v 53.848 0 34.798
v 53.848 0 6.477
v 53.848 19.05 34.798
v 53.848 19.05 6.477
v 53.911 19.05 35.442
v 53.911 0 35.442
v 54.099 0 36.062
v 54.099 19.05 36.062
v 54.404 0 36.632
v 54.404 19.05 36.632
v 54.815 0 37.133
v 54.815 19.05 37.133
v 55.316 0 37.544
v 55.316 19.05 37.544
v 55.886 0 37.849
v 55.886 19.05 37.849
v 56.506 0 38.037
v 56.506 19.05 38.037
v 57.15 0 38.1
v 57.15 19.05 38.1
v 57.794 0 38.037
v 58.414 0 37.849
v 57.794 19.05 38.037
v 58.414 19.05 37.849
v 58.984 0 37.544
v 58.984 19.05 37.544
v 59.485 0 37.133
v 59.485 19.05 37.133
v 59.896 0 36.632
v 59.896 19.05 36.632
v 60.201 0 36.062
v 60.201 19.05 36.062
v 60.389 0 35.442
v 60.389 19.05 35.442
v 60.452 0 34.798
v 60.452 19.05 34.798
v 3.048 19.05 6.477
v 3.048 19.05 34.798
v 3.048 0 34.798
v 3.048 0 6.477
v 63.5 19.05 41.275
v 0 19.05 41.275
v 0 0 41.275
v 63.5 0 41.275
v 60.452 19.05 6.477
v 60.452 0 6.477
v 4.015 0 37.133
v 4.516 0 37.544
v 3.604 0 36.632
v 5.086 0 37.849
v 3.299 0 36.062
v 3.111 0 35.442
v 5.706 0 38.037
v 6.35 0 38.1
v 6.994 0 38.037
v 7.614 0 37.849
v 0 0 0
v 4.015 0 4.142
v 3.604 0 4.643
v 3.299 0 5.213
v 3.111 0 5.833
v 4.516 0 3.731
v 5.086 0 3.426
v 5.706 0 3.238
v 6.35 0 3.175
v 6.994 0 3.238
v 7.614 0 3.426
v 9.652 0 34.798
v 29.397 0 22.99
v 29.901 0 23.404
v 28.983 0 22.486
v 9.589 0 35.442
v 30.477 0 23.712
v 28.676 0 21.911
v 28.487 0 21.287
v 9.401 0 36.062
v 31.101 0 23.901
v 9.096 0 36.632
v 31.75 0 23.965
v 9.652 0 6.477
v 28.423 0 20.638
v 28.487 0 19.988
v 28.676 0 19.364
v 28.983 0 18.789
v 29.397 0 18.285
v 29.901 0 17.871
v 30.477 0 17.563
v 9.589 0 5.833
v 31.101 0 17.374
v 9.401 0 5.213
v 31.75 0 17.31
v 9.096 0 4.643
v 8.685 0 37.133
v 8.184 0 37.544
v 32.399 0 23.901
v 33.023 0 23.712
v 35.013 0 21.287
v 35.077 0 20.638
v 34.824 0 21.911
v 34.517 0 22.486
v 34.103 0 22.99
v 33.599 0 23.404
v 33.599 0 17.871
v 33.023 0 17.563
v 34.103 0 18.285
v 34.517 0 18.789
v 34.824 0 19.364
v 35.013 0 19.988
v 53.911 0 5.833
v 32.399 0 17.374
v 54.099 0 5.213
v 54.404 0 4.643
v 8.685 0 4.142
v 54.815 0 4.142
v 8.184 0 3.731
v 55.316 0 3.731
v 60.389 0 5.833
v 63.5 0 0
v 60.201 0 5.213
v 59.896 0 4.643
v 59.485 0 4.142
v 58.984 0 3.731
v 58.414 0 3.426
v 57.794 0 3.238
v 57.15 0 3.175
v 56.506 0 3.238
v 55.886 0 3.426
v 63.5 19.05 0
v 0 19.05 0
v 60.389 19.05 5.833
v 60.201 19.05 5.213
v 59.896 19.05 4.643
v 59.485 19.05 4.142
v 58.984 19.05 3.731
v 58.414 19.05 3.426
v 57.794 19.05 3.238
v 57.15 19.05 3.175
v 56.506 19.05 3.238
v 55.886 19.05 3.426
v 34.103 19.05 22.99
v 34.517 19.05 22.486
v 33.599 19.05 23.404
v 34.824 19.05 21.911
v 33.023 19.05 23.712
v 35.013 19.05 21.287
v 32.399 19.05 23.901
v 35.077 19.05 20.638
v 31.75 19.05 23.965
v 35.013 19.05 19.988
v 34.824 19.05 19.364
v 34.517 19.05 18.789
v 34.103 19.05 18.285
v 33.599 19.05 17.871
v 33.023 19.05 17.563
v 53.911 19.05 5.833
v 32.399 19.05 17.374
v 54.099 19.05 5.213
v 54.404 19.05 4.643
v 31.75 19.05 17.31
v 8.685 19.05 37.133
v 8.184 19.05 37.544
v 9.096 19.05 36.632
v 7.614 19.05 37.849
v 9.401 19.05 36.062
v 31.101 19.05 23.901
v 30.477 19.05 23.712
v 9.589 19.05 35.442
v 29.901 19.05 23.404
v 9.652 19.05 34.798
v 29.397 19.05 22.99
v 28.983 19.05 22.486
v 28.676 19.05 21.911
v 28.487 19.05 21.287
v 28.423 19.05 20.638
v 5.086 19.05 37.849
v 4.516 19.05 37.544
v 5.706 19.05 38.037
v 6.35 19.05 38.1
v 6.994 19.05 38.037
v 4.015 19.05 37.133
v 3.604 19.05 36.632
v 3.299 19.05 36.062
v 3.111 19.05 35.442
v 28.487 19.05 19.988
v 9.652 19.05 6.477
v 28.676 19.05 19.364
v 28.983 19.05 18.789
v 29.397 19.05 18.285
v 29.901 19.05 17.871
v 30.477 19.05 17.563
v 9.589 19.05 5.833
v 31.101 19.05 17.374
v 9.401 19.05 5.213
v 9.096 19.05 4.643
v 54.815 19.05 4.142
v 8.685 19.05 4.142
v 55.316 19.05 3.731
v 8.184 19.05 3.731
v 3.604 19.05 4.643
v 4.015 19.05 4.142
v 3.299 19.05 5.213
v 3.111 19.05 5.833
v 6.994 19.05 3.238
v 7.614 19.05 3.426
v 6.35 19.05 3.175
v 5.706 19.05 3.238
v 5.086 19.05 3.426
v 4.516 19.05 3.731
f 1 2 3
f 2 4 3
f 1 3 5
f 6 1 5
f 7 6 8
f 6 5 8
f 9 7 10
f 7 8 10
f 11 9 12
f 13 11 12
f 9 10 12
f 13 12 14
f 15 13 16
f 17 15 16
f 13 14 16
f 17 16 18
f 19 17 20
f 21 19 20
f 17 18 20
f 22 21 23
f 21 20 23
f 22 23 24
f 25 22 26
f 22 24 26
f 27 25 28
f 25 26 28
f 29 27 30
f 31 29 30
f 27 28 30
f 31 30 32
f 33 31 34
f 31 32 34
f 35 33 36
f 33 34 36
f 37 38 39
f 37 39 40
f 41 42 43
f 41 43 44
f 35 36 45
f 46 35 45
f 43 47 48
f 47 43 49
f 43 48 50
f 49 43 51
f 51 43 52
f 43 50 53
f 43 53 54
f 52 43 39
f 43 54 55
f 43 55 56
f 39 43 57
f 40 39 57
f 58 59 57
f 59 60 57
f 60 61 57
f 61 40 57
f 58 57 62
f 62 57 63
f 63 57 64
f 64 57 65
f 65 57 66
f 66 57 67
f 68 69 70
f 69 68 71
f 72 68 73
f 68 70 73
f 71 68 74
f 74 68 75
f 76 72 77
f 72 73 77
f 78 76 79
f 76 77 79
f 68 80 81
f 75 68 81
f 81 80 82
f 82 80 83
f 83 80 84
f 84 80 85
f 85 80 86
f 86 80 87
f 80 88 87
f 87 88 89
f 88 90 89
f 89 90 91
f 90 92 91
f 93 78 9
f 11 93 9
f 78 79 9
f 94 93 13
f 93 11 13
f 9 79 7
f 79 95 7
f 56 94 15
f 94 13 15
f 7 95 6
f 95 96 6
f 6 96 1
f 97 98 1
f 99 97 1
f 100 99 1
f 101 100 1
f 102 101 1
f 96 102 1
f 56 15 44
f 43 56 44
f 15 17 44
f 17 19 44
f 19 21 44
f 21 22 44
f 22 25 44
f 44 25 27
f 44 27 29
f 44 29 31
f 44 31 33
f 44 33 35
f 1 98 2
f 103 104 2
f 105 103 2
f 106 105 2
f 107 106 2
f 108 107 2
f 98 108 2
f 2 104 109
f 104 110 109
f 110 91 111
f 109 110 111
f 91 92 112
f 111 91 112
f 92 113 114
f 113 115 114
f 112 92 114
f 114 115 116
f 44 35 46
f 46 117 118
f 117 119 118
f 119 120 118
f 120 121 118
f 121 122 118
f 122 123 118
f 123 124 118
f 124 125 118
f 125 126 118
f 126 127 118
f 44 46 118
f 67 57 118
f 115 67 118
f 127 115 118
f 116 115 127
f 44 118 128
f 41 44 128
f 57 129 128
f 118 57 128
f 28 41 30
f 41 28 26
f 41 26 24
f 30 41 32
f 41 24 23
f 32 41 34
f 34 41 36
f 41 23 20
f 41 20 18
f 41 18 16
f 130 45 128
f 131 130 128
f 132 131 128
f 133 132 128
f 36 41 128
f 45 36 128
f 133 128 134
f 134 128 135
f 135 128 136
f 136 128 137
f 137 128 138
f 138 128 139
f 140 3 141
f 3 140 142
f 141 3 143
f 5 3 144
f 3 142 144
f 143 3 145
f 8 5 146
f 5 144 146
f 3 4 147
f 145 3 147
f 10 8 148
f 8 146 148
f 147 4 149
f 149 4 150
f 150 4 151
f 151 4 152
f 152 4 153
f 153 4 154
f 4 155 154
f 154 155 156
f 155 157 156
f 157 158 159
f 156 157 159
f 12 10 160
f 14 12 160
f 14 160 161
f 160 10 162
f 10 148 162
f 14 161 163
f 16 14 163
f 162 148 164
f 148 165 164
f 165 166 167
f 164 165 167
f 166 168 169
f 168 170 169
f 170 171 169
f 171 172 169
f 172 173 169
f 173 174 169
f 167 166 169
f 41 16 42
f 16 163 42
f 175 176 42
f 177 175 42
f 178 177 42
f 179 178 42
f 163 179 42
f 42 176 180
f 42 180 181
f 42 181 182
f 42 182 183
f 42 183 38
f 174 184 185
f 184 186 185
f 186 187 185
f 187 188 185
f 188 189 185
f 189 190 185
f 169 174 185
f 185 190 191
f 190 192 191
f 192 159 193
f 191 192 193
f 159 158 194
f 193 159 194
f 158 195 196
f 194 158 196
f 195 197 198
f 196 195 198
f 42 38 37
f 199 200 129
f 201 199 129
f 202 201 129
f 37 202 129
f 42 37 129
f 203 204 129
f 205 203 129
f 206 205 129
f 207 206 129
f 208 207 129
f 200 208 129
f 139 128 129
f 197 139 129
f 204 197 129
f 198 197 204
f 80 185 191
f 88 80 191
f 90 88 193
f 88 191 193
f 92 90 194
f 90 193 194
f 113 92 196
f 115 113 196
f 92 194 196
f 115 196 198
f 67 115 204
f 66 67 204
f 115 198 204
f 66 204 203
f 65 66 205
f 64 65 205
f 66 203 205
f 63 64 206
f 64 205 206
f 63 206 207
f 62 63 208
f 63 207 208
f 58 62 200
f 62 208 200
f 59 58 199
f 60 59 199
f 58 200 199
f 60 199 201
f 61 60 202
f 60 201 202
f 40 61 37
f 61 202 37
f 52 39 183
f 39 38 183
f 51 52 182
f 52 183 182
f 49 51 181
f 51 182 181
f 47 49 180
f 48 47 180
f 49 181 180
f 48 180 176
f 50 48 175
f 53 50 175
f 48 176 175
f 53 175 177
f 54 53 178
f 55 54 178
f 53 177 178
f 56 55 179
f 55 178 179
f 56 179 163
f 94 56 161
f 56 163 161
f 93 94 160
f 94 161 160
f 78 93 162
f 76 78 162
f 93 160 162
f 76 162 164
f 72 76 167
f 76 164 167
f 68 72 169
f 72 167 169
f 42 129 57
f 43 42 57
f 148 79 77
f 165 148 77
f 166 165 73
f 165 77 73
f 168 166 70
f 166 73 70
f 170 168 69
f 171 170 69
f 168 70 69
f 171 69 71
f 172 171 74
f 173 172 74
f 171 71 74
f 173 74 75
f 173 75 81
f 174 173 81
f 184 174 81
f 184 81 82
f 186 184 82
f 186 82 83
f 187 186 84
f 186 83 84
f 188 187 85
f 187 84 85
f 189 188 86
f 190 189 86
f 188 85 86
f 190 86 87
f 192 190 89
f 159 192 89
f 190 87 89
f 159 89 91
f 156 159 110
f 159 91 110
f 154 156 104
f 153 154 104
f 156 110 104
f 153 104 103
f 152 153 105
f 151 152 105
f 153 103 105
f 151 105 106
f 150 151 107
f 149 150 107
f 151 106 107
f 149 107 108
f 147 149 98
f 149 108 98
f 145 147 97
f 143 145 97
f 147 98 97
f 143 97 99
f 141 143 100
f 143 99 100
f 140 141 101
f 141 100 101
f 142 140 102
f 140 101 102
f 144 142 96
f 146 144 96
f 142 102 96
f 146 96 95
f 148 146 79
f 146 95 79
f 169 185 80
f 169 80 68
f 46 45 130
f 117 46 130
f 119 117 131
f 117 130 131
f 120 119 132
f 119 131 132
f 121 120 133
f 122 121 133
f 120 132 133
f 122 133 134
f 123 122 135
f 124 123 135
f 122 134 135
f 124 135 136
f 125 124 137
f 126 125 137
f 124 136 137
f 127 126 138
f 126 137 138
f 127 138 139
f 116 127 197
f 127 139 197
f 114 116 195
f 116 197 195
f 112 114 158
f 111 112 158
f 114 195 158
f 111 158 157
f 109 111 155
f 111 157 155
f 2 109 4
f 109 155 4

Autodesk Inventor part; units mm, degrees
ref_plane "YZ Plane" through (0, 0, 0) normal (1, 0, 0) x (0, 1, 0)
ref_plane "XZ Plane" through (0, 0, 0) normal (0, 1, 0) x (-1, 0, 0)
ref_plane "XY Plane" through (0, 0, 0) normal (0, 0, 1) x (1, 0, 0)
sketch "Sketch1" plane through (0, 0, 0) normal (0, 0, 1) x (1, 0, 0)
  line L0 (0, 0) -> (63.5, 0)
  line L1 (63.5, 0) -> (63.5, 19.05)
  line L2 (63.5, 19.05) -> (0, 19.05)
  line L3 (0, 19.05) -> (0, 0)
  dimension "d2" = 63.5
  dimension "d3" = 19.05
extrude "Stock Block" add sketch "Sketch1" along normal blind 41.275
sketch "Sketch2" plane through (0, 19.05, 0) normal (0, 1, 0) x (1, 0, 0)
  line L0 (63.5, 0) -> (0, 0) projected
  line L1 (0, 0) -> (0, -41.275) projected
  point P0 (31.75, -20.6375)
  dimension "d4" = 20.6375
  dimension "d5" = 31.75
hole "Mounting Hole" at (31.75, 19.05, 20.6375) direction (0, -1, 0) diameter 6.6548 end through all
sketch "Sketch3" plane through (0, 19.05, 0) normal (0, 1, 0) x (1, 0, 0)
  line L0 (6.35, -34.798) -> (6.35, -6.477) construction
  line L1 (3.048, -34.798) -> (3.048, -6.477)
  line L2 (9.652, -6.477) -> (9.652, -34.798)
  arc A0 (3.048, -34.798) -> (9.652, -34.798) centre (6.35, -34.798) ccw
  arc A1 (9.652, -6.477) -> (3.048, -6.477) centre (6.35, -6.477) ccw
  line L3 (0, 0) -> (0, -41.275) projected
  line L4 (63.5, -41.275) -> (0, -41.275) projected
  line L5 (63.5, 0) -> (0, 0) projected
  circle A2 centre (31.75, -20.6375) radius 3.3274 projected
  line L6 (31.75, -20.6375) -> (31.75, 0) construction
  line L7 (57.15, -34.798) -> (57.15, -6.477) construction
  line L8 (60.452, -34.798) -> (60.452, -6.477)
  line L9 (53.848, -6.477) -> (53.848, -34.798)
  arc A3 (53.848, -34.798) -> (60.452, -34.798) centre (57.15, -34.798) ccw
  arc A4 (60.452, -6.477) -> (53.848, -6.477) centre (57.15, -6.477) ccw
  point P0 (6.35, -20.6375)
  point P1 (57.15, -20.6375)
  dimension "d13" = 6.604
  dimension "d15" = 3.175
  dimension "d16" = 3.175
  dimension "d24" = 25.4
extrude "Slots" cut sketch "Sketch3" against normal up to surface (19.05 mm away) contours L1 A1 L2 A0 | A3 L9 A4 L8
properties part number "Track Foot" material "Aluminum 6061"
